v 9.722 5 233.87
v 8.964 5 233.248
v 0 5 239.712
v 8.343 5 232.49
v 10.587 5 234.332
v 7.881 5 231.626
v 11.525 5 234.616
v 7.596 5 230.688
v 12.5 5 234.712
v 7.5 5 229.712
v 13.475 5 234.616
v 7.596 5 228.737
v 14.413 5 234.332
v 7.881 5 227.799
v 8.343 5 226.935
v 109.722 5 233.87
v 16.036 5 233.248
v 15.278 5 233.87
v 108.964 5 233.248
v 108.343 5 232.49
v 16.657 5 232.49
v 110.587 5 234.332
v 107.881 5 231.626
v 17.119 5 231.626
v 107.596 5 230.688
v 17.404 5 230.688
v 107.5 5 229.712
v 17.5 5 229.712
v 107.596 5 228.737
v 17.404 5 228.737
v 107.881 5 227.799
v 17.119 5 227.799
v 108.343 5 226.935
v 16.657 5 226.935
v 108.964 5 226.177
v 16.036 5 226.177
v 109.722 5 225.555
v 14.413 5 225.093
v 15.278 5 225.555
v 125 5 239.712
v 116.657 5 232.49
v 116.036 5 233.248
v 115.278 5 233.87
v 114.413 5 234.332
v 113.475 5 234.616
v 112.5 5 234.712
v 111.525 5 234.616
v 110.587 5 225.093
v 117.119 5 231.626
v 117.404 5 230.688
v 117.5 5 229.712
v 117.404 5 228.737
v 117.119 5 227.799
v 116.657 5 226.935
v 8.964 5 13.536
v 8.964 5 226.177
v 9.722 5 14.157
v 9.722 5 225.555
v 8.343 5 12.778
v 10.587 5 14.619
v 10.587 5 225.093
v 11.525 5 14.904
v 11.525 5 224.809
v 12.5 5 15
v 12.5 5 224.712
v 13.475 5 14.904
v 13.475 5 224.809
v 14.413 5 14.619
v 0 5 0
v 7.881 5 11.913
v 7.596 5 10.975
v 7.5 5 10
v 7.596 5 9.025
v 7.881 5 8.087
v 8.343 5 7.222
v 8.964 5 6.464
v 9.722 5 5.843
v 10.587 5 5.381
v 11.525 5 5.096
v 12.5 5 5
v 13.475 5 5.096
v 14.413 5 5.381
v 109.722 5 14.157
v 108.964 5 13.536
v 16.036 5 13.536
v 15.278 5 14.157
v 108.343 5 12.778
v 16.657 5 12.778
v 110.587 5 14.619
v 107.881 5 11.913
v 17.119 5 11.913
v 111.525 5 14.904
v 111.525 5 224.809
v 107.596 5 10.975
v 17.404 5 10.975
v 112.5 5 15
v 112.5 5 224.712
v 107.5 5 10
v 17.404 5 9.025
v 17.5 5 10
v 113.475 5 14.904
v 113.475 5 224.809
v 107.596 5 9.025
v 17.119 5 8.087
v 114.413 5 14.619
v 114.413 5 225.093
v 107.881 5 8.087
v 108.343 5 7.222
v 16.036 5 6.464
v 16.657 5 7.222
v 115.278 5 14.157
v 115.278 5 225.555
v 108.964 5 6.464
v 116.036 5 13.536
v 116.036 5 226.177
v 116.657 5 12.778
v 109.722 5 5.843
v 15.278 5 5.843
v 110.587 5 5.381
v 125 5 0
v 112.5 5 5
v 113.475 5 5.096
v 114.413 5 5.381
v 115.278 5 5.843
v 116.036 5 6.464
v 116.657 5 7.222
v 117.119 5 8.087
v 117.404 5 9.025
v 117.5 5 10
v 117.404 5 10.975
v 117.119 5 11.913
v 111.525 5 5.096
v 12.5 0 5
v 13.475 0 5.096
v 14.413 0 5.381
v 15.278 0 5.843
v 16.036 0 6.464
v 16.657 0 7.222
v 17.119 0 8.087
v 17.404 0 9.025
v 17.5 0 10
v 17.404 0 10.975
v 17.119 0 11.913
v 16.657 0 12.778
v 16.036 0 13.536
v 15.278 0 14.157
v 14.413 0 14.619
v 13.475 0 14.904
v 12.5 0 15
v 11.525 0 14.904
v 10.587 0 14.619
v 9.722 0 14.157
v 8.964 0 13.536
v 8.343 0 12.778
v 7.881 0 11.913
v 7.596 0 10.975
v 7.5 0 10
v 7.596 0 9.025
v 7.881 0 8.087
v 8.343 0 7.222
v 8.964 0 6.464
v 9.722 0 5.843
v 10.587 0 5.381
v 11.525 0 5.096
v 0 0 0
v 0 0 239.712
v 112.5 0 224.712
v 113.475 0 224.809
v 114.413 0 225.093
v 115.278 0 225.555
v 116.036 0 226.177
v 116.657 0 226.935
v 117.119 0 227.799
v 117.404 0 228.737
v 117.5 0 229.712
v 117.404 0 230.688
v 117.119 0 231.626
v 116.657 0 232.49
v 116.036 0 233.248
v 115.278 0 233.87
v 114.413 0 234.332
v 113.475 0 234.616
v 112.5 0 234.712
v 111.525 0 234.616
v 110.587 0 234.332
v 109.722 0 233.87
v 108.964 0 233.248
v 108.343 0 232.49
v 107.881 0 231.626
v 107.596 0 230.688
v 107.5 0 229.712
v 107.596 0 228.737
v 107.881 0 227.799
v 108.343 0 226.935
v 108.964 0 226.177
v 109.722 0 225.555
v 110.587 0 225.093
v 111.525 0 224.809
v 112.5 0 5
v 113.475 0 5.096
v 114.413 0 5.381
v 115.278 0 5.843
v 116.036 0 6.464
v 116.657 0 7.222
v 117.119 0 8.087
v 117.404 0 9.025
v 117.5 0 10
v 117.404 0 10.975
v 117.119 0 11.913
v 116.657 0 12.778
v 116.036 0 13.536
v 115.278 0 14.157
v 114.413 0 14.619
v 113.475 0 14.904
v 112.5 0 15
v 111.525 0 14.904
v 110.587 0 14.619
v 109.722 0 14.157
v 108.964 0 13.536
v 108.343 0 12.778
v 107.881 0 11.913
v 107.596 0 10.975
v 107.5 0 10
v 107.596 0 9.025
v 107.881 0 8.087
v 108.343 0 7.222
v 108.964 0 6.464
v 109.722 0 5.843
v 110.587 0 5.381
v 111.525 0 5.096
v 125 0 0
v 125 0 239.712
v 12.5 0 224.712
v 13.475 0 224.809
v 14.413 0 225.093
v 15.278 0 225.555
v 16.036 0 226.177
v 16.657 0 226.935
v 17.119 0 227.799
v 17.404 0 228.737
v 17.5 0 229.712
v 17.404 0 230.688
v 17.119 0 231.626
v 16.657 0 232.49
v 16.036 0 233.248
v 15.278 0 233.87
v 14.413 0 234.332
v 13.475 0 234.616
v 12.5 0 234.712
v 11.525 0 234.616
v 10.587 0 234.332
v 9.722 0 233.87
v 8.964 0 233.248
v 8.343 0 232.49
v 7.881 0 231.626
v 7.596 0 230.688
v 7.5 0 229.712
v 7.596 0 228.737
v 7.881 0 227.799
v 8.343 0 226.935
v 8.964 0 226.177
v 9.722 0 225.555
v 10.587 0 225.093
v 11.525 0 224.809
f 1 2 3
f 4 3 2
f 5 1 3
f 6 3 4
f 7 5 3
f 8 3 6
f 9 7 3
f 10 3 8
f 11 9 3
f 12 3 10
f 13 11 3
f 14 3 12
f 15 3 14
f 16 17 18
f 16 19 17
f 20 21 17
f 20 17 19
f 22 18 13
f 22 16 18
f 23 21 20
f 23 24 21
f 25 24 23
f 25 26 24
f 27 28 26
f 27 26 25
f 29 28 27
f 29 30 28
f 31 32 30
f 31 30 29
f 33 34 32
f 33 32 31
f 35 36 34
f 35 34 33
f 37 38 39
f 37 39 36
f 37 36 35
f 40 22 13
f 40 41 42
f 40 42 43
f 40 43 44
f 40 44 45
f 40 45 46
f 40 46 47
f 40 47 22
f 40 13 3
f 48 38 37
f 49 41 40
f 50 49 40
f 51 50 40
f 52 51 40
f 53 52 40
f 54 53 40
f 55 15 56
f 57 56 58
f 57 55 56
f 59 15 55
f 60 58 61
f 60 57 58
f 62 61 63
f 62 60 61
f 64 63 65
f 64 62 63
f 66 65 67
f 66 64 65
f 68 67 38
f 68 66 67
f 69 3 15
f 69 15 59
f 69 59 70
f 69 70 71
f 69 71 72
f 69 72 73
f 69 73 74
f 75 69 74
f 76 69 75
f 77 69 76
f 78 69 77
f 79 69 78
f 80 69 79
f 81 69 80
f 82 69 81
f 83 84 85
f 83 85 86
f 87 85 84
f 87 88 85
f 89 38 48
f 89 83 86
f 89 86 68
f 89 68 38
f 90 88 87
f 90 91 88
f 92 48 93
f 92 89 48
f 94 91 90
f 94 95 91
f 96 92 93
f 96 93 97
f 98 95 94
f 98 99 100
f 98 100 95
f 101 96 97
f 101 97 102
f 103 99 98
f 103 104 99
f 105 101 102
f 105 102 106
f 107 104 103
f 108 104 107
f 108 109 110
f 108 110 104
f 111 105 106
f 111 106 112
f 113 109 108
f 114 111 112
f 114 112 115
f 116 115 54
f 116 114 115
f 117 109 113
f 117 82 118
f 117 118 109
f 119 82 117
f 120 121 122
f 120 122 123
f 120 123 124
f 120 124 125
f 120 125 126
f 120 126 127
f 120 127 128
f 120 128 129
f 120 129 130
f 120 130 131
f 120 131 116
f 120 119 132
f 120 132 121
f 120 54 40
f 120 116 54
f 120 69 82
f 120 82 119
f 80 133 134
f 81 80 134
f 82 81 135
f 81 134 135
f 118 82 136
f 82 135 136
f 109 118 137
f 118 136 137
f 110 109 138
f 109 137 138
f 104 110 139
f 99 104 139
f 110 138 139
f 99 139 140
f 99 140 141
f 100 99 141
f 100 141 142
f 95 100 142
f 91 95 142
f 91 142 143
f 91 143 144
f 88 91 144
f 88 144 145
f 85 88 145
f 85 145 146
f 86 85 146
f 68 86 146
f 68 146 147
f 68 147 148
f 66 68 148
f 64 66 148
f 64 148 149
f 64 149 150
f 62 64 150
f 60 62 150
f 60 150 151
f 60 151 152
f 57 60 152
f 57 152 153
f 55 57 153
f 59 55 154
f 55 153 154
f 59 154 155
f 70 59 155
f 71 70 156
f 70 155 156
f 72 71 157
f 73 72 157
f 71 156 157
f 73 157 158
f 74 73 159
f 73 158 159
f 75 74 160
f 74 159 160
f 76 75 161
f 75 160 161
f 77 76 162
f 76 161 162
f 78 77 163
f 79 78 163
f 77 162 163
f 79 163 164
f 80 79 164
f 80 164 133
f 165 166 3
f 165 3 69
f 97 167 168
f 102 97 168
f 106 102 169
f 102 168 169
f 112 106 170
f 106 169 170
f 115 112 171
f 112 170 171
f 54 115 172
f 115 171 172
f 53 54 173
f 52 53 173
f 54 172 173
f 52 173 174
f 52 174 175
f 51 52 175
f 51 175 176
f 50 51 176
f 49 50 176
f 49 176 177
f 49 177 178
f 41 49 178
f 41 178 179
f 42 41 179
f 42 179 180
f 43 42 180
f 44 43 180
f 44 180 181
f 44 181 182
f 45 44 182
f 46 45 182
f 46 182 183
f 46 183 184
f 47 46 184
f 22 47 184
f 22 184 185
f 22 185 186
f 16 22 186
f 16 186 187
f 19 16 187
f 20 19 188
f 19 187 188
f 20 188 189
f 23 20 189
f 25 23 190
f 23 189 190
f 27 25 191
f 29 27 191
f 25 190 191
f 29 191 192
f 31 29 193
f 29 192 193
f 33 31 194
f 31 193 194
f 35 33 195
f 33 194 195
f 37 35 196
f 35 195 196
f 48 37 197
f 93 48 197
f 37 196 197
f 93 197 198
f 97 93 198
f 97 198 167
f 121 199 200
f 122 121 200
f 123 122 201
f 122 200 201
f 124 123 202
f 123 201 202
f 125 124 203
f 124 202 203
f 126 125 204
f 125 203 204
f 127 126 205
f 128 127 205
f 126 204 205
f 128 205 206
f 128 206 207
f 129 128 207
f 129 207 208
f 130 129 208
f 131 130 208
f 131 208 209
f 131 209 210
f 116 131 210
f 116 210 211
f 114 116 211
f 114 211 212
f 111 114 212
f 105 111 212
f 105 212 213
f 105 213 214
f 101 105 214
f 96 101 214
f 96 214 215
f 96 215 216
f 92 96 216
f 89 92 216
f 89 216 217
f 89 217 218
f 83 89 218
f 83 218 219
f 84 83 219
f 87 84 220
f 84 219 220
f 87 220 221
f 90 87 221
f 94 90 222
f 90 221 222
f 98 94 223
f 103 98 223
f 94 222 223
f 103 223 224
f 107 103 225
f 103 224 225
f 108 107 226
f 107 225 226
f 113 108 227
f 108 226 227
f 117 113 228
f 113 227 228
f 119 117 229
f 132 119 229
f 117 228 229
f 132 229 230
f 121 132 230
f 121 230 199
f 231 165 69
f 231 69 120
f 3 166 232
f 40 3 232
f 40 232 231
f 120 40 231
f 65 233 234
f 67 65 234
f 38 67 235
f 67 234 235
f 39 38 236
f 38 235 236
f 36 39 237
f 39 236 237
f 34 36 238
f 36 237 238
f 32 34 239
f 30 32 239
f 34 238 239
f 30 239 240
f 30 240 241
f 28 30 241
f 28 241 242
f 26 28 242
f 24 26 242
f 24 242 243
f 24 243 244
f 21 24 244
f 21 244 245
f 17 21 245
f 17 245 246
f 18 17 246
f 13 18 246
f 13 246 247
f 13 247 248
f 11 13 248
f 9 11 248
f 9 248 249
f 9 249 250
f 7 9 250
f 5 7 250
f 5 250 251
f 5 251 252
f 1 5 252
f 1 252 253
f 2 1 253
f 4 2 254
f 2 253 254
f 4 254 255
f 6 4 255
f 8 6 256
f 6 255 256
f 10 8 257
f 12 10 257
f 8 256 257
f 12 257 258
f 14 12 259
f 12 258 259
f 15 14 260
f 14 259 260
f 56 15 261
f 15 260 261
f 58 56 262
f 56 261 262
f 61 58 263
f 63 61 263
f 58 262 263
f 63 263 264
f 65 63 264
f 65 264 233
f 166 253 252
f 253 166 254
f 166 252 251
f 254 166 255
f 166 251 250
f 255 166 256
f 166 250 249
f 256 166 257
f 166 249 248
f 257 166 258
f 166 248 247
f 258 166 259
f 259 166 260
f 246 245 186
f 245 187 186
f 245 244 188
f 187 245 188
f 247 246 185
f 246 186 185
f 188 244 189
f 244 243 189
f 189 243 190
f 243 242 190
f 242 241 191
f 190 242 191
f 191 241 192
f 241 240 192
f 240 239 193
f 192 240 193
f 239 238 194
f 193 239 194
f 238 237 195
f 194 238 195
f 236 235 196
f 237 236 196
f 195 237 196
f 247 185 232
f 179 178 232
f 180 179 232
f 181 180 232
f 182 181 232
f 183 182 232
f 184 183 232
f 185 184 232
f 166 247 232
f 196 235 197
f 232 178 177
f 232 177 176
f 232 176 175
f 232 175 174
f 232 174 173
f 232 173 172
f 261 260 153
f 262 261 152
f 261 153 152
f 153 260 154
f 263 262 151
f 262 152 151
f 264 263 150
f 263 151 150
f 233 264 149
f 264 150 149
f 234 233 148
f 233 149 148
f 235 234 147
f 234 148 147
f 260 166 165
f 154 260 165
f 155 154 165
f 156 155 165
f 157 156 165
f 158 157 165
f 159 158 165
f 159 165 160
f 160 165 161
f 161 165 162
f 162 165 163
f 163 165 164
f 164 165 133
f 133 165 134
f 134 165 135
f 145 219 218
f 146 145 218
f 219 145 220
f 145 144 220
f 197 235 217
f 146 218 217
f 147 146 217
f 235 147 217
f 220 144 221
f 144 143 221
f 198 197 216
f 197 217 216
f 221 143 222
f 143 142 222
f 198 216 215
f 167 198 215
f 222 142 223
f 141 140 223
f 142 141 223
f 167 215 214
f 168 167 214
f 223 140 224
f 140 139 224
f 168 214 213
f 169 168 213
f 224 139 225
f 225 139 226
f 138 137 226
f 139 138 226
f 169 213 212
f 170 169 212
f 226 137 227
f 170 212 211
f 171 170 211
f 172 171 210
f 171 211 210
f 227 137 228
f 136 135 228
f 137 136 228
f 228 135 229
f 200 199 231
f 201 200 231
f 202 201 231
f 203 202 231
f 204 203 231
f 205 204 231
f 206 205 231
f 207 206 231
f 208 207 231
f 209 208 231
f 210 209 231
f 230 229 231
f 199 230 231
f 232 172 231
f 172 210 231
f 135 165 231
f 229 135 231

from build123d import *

# Parameters (mm, degrees)
SKETCH1_W           = 125
SKETCH1_H           = 239.7125
BOSS_EXTRUDE1_DEPTH = 5
CUT_EXTRUDE1_REACH  = 272.392
SKETCH2_R           = 5


with BuildPart() as part:
    # Sketch1 → Boss-Extrude1 (new body)
    with BuildSketch(Plane(origin=(0, 0, 0), x_dir=(1, 0, 0), z_dir=(0, 1, 0))):
        with Locations((62.5, -119.85625)):
            Rectangle(SKETCH1_W, SKETCH1_H)
    extrude(amount=BOSS_EXTRUDE1_DEPTH)

    # Sketch2 → Cut-Extrude1 (cut, up to next)
    with BuildSketch(Plane.XZ, mode=Mode.PRIVATE) as cut_extrude1_sk1:
        with Locations(Location((12.5, 229.7125, 0), (0, 0, 270))):
            Circle(SKETCH2_R)
    cut_extrude1_tool1 = extrude(cut_extrude1_sk1.sketch, amount=-CUT_EXTRUDE1_REACH, mode=Mode.PRIVATE) & part.part
    # Sketch2 → Cut-Extrude1 (cut, up to next)
    with BuildSketch(Plane.XZ, mode=Mode.PRIVATE) as cut_extrude1_sk2:
        with Locations(Location((112.5, 229.7125, 0), (0, 0, 270))):
            Circle(SKETCH2_R)
    cut_extrude1_tool2 = extrude(cut_extrude1_sk2.sketch, amount=-CUT_EXTRUDE1_REACH, mode=Mode.PRIVATE) & part.part
    # Sketch2 → Cut-Extrude1 (cut, up to next)
    with BuildSketch(Plane.XZ, mode=Mode.PRIVATE) as cut_extrude1_sk3:
        with Locations(Location((12.5, 10, 0), (0, 0, 270))):
            Circle(SKETCH2_R)
    cut_extrude1_tool3 = extrude(cut_extrude1_sk3.sketch, amount=-CUT_EXTRUDE1_REACH, mode=Mode.PRIVATE) & part.part
    # Sketch2 → Cut-Extrude1 (cut, up to next)
    with BuildSketch(Plane.XZ, mode=Mode.PRIVATE) as cut_extrude1_sk4:
        with Locations(Location((112.5, 10, 0), (0, 0, 270))):
            Circle(SKETCH2_R)
    cut_extrude1_tool4 = extrude(cut_extrude1_sk4.sketch, amount=-CUT_EXTRUDE1_REACH, mode=Mode.PRIVATE) & part.part
    add(cut_extrude1_tool1.solids().sort_by_distance((12.5, 0, 229.7125))[0], mode=Mode.SUBTRACT)
    add(cut_extrude1_tool2.solids().sort_by_distance((112.5, 0, 229.7125))[0], mode=Mode.SUBTRACT)
    add(cut_extrude1_tool3.solids().sort_by_distance((12.5, 0, 10))[0], mode=Mode.SUBTRACT)
    add(cut_extrude1_tool4.solids().sort_by_distance((112.5, 0, 10))[0], mode=Mode.SUBTRACT)


solid = part.part
